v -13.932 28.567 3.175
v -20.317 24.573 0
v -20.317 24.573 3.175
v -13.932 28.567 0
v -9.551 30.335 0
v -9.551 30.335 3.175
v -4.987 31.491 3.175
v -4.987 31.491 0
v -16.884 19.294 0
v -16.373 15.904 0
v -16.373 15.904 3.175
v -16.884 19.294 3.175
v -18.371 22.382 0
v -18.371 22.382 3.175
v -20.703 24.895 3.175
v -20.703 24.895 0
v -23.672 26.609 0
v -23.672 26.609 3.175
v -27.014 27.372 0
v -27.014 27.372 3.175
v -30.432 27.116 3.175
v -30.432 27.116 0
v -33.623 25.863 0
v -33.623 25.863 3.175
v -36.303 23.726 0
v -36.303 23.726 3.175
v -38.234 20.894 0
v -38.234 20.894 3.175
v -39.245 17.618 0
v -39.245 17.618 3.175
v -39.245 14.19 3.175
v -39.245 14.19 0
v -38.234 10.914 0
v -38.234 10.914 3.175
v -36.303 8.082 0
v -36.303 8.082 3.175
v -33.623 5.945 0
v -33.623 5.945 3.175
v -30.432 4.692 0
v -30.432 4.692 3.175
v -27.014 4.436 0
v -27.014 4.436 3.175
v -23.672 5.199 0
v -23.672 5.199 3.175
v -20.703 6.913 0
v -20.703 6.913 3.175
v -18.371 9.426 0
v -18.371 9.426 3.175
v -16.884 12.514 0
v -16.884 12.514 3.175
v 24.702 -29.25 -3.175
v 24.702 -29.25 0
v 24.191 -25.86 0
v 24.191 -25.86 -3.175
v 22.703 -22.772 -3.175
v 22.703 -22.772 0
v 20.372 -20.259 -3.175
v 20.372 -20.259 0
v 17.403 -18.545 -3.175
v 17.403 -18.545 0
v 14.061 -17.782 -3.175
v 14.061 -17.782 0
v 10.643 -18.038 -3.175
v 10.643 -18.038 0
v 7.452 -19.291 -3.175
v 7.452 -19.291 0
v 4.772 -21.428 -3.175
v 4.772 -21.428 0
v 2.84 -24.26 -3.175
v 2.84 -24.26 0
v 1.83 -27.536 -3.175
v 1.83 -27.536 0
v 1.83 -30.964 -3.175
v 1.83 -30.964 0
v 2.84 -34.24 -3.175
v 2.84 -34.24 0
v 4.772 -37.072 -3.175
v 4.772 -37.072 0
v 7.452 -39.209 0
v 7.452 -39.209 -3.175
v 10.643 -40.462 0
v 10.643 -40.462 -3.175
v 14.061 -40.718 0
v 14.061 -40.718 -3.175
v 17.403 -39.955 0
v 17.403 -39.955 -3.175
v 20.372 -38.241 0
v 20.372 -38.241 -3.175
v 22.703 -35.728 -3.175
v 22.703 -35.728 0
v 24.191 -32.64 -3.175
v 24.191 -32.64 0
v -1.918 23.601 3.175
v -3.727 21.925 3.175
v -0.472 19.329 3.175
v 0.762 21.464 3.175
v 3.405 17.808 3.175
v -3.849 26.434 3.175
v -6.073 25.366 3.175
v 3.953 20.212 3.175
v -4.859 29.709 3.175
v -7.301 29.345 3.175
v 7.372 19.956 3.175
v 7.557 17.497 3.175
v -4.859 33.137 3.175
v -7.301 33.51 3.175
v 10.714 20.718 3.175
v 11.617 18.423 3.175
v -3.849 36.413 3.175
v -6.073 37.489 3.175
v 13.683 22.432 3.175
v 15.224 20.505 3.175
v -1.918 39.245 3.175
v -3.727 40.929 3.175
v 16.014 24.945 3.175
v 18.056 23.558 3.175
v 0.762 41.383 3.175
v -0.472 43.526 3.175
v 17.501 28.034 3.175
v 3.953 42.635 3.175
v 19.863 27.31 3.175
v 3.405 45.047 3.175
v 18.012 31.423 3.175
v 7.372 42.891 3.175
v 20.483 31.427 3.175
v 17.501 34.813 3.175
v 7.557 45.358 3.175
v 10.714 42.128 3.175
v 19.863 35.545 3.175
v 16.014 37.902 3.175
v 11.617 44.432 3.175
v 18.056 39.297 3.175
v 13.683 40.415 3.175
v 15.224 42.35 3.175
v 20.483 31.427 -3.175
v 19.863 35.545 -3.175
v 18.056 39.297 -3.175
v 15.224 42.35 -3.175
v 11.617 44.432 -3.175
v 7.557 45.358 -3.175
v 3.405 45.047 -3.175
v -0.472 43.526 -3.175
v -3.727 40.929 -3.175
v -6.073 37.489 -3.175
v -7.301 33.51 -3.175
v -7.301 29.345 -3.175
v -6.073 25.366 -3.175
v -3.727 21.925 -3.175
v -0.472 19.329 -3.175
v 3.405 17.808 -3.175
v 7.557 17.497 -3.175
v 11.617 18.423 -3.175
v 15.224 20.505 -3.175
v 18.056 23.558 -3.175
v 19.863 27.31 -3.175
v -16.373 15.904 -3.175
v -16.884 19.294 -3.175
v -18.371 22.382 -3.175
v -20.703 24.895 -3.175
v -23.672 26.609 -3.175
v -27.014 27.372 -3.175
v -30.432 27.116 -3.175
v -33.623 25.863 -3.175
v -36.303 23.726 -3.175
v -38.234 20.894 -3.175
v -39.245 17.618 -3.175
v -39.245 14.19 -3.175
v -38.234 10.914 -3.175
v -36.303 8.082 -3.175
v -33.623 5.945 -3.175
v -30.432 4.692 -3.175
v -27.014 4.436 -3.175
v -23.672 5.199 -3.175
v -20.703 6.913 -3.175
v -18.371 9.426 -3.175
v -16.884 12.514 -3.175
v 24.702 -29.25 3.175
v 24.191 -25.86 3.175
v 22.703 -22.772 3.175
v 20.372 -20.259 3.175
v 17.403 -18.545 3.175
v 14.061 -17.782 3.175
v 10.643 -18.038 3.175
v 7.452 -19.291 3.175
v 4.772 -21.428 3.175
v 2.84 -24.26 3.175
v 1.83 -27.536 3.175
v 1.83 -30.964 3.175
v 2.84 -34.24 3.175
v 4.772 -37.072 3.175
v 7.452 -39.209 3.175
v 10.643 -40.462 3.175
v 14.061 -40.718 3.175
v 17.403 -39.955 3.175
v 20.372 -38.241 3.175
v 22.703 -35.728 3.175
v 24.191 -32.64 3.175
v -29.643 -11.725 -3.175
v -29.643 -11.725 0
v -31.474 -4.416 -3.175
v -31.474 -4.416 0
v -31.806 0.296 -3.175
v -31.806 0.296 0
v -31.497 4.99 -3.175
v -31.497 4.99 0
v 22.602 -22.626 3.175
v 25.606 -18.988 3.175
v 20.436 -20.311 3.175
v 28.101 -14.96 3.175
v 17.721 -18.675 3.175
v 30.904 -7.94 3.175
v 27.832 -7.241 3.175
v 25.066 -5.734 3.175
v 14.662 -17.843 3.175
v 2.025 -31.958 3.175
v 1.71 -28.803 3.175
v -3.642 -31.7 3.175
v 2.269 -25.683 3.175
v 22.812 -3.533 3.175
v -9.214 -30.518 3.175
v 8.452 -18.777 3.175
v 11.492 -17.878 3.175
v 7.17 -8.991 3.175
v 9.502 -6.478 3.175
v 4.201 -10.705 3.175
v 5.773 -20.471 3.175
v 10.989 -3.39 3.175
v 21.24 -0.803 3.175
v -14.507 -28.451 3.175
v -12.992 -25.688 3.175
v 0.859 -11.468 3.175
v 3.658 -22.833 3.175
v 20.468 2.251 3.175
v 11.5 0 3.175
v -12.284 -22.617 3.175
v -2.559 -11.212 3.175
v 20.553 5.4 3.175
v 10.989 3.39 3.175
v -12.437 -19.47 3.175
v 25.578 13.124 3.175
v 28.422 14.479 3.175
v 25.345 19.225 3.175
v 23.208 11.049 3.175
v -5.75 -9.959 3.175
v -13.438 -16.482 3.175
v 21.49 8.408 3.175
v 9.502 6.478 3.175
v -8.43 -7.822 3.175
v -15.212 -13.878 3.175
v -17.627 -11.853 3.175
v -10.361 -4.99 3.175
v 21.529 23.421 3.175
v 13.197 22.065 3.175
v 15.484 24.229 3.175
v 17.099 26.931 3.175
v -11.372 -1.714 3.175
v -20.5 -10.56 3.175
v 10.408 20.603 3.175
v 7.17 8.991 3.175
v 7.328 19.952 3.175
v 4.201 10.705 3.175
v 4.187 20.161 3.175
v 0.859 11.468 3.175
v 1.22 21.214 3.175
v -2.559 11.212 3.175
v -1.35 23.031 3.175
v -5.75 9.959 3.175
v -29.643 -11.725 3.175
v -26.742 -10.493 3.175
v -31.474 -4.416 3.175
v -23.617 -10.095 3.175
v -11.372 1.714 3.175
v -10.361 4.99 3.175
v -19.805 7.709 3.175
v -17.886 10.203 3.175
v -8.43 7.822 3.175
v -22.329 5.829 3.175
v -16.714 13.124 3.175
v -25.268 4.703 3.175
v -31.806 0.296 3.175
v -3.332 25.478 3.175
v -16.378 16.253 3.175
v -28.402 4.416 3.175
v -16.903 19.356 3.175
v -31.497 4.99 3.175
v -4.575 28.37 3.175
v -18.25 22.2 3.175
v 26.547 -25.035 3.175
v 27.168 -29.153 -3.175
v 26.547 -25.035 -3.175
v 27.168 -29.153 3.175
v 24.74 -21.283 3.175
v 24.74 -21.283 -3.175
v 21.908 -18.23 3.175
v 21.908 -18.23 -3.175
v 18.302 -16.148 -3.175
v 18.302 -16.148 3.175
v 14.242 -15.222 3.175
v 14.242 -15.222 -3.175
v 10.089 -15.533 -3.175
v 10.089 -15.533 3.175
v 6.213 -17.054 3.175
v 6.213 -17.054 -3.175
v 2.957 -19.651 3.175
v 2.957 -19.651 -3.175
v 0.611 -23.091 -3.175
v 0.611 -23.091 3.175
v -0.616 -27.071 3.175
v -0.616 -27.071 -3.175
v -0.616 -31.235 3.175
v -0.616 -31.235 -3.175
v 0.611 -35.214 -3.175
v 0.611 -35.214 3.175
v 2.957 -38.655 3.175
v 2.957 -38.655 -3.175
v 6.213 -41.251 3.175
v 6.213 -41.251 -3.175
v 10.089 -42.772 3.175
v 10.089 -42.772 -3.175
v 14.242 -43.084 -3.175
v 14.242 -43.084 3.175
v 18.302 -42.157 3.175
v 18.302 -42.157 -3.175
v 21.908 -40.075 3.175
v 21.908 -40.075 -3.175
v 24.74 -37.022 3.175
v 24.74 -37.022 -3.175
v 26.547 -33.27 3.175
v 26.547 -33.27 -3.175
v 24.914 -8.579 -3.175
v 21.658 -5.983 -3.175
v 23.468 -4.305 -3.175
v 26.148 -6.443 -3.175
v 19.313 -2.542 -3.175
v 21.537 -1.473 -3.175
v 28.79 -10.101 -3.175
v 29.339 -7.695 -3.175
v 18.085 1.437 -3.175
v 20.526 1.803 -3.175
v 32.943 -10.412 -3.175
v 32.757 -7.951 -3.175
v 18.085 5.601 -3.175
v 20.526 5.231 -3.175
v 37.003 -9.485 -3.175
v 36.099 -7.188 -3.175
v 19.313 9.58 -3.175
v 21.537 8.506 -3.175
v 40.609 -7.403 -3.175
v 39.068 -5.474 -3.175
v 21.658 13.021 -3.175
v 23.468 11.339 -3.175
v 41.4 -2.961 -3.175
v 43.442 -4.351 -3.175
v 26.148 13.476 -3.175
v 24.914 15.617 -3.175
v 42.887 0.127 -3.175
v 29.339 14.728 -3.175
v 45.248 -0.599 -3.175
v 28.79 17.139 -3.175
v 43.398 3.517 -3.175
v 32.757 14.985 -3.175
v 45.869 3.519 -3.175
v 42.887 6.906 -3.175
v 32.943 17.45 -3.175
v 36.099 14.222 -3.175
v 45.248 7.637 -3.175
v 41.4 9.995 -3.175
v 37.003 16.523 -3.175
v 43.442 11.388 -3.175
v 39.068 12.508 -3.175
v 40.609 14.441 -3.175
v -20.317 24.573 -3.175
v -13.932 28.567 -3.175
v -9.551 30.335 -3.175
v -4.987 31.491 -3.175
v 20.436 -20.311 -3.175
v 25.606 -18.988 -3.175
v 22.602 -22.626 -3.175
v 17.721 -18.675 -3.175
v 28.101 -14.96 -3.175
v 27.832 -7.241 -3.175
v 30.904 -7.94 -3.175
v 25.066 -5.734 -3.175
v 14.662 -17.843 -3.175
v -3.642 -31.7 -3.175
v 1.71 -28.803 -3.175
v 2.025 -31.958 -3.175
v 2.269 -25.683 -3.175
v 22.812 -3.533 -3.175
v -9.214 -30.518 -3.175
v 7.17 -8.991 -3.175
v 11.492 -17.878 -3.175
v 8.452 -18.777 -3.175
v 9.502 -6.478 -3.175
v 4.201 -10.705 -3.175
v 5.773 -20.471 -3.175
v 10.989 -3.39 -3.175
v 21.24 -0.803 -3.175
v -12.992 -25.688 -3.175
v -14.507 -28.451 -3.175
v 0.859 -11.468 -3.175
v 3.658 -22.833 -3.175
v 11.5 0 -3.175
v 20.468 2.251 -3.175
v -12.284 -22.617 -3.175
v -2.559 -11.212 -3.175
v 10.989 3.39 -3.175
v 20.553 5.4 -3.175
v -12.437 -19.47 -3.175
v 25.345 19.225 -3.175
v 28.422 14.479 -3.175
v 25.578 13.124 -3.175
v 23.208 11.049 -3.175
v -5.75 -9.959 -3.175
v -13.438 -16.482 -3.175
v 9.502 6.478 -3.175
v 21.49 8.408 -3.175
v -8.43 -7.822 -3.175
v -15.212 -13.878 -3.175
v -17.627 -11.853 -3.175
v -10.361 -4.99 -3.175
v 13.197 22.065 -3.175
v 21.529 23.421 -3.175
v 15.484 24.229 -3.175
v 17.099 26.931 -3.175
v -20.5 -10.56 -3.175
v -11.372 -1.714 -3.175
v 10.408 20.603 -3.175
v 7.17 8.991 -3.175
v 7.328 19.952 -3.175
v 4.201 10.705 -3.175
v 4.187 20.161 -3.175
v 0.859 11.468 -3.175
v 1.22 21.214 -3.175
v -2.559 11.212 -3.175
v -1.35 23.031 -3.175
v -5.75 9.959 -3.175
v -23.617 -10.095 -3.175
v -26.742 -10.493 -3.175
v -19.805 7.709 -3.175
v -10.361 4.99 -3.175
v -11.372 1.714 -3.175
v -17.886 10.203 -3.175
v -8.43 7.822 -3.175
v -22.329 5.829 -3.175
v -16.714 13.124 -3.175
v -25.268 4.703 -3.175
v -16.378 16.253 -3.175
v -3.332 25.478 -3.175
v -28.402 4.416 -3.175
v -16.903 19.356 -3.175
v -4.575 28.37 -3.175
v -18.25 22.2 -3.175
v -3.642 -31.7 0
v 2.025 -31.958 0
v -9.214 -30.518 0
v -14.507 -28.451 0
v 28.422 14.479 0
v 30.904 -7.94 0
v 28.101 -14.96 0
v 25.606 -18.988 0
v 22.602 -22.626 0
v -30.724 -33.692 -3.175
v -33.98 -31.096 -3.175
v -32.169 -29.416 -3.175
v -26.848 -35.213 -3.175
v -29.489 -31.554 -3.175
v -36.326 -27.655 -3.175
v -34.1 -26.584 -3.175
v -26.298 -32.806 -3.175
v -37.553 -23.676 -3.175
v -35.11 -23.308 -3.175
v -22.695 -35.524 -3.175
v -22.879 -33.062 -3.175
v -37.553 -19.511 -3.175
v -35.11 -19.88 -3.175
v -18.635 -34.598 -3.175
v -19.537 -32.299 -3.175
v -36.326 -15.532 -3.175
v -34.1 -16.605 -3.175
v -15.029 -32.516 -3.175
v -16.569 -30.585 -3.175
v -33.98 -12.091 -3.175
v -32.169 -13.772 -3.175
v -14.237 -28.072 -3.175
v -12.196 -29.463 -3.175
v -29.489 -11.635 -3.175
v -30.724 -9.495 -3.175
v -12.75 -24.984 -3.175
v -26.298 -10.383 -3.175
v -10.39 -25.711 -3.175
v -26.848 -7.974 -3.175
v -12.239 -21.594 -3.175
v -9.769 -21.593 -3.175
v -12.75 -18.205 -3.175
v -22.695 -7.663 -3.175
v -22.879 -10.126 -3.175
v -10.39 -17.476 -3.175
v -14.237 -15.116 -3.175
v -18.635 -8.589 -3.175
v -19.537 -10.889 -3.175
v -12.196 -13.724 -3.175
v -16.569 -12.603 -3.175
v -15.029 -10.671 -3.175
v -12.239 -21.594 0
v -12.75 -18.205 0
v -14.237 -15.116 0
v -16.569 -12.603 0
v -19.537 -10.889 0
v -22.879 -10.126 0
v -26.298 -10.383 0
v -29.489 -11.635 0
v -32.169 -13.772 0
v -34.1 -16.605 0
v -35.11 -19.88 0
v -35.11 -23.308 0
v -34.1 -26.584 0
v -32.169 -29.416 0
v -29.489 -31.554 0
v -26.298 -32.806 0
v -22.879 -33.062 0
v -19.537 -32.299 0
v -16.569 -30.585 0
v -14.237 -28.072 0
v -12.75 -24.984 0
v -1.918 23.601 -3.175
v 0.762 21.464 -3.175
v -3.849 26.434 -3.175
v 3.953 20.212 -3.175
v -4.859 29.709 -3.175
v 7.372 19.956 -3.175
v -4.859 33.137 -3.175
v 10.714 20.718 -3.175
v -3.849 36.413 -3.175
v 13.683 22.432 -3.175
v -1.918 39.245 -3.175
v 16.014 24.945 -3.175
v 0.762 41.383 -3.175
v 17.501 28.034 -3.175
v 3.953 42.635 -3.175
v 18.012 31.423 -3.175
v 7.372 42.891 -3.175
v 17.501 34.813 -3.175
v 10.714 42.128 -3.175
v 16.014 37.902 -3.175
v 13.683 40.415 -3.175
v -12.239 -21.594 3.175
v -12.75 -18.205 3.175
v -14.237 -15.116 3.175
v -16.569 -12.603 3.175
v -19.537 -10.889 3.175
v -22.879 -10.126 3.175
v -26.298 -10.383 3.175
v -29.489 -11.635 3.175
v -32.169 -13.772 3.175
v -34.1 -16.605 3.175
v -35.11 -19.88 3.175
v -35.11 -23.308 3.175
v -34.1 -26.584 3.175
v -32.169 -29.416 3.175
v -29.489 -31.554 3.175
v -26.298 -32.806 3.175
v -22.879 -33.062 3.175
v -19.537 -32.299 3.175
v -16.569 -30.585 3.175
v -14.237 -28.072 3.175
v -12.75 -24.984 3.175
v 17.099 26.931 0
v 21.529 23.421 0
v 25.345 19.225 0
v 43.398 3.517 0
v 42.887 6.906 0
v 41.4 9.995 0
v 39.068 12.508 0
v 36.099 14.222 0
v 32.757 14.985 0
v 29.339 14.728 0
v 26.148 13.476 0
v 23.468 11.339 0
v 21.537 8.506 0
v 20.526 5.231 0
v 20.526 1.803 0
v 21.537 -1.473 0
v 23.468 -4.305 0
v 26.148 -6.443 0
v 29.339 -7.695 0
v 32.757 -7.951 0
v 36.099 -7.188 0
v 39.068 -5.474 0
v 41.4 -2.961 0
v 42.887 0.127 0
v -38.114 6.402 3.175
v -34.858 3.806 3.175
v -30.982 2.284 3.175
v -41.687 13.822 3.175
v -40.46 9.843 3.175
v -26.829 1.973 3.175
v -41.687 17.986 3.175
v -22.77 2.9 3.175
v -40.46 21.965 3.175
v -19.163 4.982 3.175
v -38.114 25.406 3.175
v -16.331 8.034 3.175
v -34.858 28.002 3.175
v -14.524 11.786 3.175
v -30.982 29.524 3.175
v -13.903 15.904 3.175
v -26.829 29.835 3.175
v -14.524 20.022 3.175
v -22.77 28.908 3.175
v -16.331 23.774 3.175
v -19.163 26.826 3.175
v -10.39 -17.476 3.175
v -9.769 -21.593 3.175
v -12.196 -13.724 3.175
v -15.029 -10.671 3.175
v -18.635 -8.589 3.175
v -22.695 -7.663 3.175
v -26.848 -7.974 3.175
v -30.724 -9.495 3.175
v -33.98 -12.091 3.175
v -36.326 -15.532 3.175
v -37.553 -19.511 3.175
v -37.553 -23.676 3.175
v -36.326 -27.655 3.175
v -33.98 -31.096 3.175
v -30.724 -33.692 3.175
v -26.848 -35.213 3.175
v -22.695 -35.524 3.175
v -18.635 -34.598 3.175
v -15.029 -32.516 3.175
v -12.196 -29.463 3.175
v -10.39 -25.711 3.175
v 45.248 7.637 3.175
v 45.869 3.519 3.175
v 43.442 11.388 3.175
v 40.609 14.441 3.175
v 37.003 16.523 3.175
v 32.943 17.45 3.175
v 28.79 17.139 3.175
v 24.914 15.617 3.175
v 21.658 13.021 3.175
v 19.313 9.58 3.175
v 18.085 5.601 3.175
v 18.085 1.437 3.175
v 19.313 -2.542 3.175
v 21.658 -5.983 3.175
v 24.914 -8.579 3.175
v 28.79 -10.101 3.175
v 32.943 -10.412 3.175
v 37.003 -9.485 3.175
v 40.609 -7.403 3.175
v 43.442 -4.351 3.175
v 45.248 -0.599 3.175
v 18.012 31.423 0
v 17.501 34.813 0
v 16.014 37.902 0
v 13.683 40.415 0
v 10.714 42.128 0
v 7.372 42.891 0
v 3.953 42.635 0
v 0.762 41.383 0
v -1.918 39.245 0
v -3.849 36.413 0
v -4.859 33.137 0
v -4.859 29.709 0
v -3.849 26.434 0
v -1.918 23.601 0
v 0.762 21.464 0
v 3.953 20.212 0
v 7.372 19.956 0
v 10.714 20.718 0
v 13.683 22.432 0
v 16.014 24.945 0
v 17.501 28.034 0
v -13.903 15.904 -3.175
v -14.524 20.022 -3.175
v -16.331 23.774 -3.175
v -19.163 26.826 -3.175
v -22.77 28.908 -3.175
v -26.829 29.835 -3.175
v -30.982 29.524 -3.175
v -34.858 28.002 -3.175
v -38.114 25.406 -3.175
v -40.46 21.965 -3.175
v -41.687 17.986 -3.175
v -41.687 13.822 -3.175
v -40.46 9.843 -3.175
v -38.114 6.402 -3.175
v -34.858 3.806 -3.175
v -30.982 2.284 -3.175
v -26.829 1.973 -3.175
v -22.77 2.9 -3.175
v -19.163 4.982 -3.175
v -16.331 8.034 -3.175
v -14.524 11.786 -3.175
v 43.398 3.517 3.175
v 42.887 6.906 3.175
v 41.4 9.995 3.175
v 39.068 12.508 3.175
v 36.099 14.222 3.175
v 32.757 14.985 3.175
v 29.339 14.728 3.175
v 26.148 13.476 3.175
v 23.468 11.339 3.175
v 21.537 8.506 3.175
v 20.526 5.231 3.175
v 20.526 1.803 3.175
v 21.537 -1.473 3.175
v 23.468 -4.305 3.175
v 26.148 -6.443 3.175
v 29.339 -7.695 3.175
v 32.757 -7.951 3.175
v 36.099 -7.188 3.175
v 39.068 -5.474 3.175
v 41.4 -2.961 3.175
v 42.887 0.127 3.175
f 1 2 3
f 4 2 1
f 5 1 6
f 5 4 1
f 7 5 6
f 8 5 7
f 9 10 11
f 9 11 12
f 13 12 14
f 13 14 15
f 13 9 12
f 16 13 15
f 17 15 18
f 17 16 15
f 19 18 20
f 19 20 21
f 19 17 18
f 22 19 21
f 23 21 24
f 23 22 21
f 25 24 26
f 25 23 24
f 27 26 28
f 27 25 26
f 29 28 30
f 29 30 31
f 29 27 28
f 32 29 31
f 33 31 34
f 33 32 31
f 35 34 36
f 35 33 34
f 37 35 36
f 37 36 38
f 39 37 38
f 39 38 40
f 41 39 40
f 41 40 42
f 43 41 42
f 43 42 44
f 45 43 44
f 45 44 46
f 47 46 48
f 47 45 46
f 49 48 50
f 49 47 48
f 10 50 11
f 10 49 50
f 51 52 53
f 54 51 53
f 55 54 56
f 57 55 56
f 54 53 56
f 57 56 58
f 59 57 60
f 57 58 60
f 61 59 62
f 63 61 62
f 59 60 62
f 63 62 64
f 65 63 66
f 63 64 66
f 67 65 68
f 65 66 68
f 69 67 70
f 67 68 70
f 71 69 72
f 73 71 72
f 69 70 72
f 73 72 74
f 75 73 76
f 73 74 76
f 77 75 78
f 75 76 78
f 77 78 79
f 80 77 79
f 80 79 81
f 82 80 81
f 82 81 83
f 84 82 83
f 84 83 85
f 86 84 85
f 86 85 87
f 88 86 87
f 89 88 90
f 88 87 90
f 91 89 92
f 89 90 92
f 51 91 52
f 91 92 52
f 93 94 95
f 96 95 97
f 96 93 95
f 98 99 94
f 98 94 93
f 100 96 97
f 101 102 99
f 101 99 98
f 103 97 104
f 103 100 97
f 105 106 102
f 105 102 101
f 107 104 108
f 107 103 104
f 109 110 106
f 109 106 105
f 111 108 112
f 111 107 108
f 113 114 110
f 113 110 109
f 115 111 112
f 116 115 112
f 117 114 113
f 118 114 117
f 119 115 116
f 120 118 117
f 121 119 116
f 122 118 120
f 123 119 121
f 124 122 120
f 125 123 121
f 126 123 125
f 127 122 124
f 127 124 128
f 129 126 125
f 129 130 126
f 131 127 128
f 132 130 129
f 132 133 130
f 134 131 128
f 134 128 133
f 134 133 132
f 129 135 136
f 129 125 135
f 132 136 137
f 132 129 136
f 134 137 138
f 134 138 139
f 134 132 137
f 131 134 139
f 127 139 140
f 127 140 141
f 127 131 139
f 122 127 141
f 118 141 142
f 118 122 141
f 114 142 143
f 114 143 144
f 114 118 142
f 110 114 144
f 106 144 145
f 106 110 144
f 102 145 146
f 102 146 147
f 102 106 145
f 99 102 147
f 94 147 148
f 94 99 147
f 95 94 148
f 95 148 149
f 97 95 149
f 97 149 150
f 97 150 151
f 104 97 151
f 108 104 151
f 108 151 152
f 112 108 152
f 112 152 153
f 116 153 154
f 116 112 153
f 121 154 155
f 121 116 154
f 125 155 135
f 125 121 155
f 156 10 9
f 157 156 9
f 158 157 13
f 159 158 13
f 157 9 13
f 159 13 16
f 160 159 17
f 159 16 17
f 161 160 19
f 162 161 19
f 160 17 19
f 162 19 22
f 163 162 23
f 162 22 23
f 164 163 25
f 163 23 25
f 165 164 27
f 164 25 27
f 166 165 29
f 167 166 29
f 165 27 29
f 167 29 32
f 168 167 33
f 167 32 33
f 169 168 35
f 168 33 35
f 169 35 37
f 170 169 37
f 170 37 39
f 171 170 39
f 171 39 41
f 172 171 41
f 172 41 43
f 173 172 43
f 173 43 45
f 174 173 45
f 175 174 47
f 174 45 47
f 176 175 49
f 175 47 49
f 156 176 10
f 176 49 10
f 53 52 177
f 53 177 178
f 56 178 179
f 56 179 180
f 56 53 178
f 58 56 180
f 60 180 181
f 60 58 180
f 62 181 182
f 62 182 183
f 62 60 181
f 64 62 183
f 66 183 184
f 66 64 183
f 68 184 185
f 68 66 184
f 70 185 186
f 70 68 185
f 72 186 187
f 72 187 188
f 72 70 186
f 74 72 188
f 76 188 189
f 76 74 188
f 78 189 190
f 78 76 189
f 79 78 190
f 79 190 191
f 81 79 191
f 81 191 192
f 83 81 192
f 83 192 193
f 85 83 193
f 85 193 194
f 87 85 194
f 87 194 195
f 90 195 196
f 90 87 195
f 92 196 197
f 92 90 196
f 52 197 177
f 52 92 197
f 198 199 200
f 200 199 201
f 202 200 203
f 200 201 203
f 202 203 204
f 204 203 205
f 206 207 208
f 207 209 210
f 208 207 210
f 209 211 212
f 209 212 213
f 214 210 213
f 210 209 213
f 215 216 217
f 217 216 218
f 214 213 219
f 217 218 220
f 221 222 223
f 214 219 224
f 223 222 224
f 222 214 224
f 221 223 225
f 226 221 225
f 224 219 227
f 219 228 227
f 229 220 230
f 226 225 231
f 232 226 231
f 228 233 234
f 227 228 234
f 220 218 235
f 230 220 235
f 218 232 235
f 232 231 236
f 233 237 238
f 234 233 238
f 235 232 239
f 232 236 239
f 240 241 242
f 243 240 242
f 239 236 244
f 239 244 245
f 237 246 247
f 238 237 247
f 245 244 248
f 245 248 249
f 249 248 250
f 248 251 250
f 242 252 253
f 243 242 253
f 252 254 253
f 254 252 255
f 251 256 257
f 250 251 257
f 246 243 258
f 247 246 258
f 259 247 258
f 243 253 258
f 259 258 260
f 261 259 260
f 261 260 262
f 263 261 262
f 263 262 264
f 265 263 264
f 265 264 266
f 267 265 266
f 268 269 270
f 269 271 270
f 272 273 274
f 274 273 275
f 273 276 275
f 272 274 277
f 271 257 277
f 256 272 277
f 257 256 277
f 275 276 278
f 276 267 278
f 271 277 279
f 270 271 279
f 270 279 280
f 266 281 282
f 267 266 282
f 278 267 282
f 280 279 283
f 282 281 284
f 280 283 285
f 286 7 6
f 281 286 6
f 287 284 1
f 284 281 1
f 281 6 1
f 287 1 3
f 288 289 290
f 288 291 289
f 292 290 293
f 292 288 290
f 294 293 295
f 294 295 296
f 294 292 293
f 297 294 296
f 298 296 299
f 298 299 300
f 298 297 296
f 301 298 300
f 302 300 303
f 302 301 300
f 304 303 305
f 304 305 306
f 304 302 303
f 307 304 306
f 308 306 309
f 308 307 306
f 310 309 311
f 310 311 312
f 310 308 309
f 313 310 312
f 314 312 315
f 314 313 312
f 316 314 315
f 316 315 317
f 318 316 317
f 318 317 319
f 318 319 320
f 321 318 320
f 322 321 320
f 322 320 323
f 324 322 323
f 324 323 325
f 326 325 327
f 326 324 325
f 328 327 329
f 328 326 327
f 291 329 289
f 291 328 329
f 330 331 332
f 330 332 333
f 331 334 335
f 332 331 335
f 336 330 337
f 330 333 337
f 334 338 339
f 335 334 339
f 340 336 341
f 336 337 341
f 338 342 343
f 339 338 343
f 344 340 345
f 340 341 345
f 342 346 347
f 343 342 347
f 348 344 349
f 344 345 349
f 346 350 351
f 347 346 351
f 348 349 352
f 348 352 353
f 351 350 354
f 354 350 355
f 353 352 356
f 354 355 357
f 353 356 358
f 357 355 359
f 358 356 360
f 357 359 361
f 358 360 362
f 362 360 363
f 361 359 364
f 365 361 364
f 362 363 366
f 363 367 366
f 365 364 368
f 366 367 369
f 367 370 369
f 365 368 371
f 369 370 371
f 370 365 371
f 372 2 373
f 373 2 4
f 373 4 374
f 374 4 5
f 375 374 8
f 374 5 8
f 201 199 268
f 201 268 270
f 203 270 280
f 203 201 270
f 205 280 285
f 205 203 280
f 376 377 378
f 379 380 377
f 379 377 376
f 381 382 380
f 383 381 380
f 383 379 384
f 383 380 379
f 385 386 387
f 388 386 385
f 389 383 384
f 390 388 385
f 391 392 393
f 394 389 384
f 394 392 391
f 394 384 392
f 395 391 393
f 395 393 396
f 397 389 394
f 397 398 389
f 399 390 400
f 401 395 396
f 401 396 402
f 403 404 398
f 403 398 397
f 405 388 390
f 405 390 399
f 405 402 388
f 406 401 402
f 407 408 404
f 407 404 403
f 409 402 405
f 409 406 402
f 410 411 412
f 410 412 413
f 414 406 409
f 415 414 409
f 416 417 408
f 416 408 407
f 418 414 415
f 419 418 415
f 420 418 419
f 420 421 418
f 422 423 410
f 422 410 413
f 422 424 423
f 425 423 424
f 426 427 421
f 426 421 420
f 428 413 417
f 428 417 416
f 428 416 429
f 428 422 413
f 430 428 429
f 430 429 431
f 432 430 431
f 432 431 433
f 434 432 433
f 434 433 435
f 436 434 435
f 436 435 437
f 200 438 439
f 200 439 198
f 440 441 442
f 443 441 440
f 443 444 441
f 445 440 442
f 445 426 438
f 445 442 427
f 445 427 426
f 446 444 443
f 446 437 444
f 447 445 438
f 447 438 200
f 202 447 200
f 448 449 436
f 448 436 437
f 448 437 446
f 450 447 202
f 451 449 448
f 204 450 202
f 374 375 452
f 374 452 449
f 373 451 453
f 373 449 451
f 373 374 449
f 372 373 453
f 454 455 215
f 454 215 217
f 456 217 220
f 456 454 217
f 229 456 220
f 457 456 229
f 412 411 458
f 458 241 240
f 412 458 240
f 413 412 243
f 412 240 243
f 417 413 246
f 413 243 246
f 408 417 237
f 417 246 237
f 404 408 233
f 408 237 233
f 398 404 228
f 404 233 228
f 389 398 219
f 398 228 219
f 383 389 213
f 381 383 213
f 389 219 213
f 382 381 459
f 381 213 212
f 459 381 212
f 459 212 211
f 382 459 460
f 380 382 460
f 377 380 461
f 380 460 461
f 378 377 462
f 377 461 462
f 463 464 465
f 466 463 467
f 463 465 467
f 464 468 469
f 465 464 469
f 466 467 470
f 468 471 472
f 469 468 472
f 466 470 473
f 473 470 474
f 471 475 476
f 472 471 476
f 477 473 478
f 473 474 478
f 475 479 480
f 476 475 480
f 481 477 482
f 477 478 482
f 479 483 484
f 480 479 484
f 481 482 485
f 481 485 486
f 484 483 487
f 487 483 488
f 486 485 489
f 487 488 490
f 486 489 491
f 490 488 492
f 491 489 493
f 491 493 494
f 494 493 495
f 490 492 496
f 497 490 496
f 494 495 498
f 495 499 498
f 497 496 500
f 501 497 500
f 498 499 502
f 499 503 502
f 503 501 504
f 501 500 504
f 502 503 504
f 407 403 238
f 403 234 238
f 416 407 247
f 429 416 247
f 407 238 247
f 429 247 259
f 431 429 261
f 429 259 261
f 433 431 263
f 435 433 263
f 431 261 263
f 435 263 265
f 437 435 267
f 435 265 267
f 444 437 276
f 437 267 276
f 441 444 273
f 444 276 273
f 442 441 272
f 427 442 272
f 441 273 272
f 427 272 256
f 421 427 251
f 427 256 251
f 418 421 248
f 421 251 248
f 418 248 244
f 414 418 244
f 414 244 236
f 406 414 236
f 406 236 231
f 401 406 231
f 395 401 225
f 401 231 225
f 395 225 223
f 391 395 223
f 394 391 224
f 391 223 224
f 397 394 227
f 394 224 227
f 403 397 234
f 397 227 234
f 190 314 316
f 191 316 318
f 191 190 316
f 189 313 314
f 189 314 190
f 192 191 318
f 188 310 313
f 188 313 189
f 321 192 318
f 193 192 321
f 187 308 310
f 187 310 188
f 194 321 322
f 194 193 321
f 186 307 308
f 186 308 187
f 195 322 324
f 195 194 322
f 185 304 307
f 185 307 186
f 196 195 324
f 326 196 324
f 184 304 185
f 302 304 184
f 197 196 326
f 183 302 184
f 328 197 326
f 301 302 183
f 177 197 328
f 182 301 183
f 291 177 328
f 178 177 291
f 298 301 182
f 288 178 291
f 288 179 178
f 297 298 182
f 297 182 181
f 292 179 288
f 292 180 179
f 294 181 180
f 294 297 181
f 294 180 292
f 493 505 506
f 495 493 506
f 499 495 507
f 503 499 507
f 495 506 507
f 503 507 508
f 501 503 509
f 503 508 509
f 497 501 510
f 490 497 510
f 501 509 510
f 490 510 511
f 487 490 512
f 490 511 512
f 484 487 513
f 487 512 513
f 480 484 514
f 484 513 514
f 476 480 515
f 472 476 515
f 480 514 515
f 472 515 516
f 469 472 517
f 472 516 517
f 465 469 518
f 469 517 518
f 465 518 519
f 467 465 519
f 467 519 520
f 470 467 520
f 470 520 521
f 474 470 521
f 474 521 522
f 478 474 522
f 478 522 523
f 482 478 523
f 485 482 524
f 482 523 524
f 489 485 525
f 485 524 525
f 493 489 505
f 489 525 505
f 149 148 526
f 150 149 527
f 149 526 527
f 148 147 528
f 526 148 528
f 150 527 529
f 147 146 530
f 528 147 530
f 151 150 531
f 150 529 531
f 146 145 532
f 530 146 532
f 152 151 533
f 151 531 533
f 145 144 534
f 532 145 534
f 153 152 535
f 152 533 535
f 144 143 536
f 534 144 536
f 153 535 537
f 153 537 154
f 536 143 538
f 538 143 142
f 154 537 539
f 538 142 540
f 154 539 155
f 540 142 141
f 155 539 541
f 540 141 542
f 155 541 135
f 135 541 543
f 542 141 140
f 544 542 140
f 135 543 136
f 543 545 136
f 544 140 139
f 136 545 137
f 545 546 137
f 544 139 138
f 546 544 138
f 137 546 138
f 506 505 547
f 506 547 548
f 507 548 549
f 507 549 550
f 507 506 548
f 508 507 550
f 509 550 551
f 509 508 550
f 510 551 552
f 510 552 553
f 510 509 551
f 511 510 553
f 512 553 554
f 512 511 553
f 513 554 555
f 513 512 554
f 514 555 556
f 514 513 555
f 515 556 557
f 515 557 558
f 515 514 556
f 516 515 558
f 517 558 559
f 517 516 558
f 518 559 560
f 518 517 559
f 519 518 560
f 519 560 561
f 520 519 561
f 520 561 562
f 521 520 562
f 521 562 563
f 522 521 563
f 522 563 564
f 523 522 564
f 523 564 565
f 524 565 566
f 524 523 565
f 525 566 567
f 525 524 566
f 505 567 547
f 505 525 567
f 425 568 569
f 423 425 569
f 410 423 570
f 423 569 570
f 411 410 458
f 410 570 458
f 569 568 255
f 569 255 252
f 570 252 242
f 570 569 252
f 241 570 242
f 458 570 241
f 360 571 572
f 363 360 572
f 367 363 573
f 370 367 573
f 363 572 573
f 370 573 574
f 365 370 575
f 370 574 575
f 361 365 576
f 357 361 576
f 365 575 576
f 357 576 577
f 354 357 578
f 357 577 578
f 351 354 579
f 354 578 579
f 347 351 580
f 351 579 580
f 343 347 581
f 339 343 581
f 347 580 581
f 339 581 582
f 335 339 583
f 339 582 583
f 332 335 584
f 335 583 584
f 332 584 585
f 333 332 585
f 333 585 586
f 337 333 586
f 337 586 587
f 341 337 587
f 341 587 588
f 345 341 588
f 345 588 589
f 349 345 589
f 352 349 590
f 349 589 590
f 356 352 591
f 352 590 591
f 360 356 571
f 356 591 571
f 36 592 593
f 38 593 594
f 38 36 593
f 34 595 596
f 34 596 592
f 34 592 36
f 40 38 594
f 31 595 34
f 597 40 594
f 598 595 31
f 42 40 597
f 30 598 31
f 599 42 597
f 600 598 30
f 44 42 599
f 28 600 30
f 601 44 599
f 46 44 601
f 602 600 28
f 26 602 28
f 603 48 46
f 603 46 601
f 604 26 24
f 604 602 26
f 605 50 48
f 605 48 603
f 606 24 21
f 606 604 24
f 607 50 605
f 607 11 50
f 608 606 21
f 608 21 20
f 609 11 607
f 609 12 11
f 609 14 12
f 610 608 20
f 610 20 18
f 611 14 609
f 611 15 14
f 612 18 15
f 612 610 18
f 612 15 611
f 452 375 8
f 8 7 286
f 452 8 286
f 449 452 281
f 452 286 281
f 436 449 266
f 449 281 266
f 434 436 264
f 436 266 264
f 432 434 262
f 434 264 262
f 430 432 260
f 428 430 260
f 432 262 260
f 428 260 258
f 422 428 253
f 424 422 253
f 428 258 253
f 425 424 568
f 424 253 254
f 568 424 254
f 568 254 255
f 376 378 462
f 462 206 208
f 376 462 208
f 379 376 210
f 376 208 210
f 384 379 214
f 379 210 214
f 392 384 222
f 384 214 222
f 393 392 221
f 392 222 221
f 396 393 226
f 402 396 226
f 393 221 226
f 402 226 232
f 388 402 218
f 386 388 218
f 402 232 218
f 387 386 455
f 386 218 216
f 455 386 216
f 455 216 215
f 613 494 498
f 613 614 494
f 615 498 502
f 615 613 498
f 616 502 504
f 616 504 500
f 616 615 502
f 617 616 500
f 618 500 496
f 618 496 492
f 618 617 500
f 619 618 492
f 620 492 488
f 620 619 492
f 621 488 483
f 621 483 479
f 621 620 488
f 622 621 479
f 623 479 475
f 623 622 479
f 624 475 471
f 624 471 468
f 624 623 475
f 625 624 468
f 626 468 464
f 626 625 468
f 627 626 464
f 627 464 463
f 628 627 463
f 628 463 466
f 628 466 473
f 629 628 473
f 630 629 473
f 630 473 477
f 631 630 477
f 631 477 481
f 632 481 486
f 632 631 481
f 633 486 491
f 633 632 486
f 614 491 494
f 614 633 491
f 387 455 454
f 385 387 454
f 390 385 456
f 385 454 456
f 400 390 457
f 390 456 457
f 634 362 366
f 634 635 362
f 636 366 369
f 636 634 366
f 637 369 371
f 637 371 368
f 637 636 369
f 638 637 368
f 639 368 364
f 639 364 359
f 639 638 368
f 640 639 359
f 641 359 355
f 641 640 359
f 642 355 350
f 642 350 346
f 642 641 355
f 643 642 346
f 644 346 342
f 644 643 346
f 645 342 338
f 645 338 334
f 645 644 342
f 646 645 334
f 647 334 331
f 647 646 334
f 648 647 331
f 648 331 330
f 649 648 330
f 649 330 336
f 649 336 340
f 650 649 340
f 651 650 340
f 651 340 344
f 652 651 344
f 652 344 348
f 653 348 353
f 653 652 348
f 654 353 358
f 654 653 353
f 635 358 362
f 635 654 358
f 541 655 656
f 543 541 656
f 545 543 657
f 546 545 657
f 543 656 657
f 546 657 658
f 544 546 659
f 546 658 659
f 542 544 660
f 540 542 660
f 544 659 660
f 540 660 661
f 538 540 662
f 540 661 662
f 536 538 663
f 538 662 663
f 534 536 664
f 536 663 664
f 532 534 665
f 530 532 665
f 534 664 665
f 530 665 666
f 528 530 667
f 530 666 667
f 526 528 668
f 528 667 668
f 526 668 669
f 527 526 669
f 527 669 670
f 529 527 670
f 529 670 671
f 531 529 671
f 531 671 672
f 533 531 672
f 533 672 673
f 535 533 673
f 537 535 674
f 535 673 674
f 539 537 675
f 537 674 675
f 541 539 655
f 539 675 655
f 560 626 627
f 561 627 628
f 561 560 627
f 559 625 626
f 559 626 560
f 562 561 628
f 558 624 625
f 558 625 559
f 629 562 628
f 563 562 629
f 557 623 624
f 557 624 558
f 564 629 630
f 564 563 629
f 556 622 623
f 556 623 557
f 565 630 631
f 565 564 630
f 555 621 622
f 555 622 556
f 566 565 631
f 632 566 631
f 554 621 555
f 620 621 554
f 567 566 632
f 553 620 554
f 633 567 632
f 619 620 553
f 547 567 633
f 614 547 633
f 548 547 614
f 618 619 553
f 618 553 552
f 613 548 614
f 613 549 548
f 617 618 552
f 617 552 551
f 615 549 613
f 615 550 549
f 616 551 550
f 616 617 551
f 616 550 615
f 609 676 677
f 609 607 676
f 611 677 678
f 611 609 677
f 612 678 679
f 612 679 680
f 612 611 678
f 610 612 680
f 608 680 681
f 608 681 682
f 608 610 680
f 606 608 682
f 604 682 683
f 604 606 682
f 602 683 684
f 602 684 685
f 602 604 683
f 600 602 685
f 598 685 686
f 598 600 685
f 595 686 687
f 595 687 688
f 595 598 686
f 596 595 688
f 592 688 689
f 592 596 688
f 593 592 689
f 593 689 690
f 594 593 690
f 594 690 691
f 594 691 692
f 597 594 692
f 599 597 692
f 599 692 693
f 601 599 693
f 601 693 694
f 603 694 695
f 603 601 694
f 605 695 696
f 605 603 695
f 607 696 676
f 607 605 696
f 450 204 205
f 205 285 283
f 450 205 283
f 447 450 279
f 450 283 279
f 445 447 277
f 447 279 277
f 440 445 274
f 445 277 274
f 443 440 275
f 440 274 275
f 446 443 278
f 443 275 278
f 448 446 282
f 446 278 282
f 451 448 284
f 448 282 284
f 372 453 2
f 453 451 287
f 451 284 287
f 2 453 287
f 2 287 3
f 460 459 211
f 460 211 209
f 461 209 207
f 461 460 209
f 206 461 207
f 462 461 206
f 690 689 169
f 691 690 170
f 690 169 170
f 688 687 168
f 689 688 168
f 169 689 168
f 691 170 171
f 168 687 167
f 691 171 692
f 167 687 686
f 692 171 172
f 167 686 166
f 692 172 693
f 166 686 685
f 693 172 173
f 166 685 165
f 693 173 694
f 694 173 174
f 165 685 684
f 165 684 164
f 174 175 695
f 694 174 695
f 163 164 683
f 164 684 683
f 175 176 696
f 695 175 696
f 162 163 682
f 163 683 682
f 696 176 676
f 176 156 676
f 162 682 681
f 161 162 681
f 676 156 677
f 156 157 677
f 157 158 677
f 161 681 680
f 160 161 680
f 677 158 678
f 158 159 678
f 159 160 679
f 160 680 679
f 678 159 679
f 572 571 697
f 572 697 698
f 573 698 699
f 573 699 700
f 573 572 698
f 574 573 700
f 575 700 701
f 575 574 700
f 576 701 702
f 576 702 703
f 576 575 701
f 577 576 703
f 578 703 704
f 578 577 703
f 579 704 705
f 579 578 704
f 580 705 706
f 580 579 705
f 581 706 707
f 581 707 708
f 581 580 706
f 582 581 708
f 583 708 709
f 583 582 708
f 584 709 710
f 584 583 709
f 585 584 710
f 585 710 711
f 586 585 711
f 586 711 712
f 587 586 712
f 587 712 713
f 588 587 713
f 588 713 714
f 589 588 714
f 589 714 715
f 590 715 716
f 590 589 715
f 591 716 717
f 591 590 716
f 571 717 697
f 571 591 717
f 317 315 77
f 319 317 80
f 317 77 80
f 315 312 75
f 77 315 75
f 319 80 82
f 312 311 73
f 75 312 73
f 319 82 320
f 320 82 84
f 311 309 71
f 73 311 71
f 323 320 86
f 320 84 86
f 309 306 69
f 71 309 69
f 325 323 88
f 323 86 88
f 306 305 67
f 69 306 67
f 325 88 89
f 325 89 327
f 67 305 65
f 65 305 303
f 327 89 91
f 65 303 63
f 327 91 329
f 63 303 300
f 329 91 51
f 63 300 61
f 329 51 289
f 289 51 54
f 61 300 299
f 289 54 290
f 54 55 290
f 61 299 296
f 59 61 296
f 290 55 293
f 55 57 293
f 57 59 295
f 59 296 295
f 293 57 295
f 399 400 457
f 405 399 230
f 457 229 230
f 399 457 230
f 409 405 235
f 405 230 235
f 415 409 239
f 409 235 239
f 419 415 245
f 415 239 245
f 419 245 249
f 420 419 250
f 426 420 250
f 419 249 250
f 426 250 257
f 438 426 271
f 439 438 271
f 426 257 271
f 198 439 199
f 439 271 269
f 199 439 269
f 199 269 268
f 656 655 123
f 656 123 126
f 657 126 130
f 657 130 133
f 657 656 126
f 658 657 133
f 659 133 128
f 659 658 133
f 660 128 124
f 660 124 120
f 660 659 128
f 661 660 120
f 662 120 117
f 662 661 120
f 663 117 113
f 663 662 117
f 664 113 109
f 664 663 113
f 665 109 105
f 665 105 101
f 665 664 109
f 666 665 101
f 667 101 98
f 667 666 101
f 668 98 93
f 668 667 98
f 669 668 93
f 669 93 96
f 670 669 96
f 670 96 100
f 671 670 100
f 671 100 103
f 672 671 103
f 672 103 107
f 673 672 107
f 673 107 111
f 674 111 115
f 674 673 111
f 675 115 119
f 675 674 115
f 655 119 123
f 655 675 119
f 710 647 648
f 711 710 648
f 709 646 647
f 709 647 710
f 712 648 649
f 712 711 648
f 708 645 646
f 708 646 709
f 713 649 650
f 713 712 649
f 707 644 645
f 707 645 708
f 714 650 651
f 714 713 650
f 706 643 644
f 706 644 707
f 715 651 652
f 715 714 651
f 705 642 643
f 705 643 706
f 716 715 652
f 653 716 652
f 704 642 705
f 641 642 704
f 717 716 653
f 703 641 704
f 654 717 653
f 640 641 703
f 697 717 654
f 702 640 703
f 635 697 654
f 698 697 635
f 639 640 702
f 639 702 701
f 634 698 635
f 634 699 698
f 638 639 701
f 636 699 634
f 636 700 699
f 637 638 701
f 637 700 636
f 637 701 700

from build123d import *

# Parameters (mm, degrees)
F3_DEPTH = 3.175
F2_R     = 13.97
F0_R     = 11.5
F4_DEPTH = 3.175


with BuildPart() as f3:
    # F1 (on Top) → F3 (new body, symmetric)
    with BuildSketch(Plane.XY):
        with BuildLine():
            add(Edge.make_bspline(
                [(-27.873260784, 15.9037485054), (-21.3244938042, 27.3717698023), (8.4685993161, 40.8191929902), (41.457301605, 4.5953850008), (17.1322852663, -38.2682187447), (-30.824072945, -27.9845963151), (-34.4215522774, 4.4365598673), (-27.873260784, 15.9037485054)],
                knots=[0, 0, 0, 0, 0.1999224711, 0.3998324305, 0.6001846065, 0.8000920447, 1, 1, 1, 1], degree=3))
        make_face()
    extrude(amount=F3_DEPTH, both=True)


with BuildPart() as f3b:
    # F2 (on Top) → F3, piece 2 (new body, symmetric)
    with BuildSketch(Plane.XY):
        with Locations((-23.7389784306, -21.5934924781)):
            Circle(F2_R)
    extrude(amount=F3_DEPTH, both=True)


with BuildPart() as f3c:
    # F2 (on Top) → F3, piece 3 (new body, symmetric)
    with BuildSketch(Plane.XY):
        with Locations((13.1979174912, -29.1526708752)):
            Circle(F2_R)
    extrude(amount=F3_DEPTH, both=True)


with BuildPart() as f3d:
    # F2 (on Top) → F3, piece 4 (new body, symmetric)
    with BuildSketch(Plane.XY):
        with Locations((-27.873320505, 15.9039217979)):
            Circle(F2_R)
    extrude(amount=F3_DEPTH, both=True)


with BuildPart() as f3e:
    # F2 (on Top) → F3, piece 5 (new body, symmetric)
    with BuildSketch(Plane.XY):
        with Locations((6.5133511089, 31.4274802804)):
            Circle(F2_R)
    extrude(amount=F3_DEPTH, both=True)


with BuildPart() as f3f:
    # F2 (on Top) → F3, piece 6 (new body, symmetric)
    with BuildSketch(Plane.XY):
        with Locations((31.8990834057, 3.5189150367)):
            Circle(F2_R)
    extrude(amount=F3_DEPTH, both=True)


with BuildPart() as f4_tool:
    # F0 (on Top) → F4 (new body, symmetric)
    with BuildSketch(Plane.XY):
        with Locations((6.5123755613, 31.4234405064)):
            Circle(F0_R)
        with Locations((31.8979025802, 3.5167399241)):
            Circle(F0_R)
        with Locations((13.2016124031, -29.2499757037)):
            Circle(F0_R)
        with Locations((-23.7388574088, -21.5942190791)):
            Circle(F0_R)
        with Locations((-27.8730331358, 15.9040143523)):
            Circle(F0_R)
        Circle(F0_R)
    extrude(amount=F4_DEPTH, both=True)


with BuildPart() as f3_1:
    add(f3.part)

    # F4: cut by f4_tool
    add(f4_tool.part, mode=Mode.SUBTRACT)


with BuildPart() as f3b_1:
    add(f3b.part)

    # F4: cut by f4_tool
    add(f4_tool.part, mode=Mode.SUBTRACT)


with BuildPart() as f3c_1:
    add(f3c.part)

    # F4: cut by f4_tool
    add(f4_tool.part, mode=Mode.SUBTRACT)


with BuildPart() as f3d_1:
    add(f3d.part)

    # F4: cut by f4_tool
    add(f4_tool.part, mode=Mode.SUBTRACT)


with BuildPart() as f3e_1:
    add(f3e.part)

    # F4: cut by f4_tool
    add(f4_tool.part, mode=Mode.SUBTRACT)


with BuildPart() as f3f_1:
    add(f3f.part)

    # F4: cut by f4_tool
    add(f4_tool.part, mode=Mode.SUBTRACT)


solid = Compound([f3_1.part, f3b_1.part, f3c_1.part, f3d_1.part, f3e_1.part, f3f_1.part])
